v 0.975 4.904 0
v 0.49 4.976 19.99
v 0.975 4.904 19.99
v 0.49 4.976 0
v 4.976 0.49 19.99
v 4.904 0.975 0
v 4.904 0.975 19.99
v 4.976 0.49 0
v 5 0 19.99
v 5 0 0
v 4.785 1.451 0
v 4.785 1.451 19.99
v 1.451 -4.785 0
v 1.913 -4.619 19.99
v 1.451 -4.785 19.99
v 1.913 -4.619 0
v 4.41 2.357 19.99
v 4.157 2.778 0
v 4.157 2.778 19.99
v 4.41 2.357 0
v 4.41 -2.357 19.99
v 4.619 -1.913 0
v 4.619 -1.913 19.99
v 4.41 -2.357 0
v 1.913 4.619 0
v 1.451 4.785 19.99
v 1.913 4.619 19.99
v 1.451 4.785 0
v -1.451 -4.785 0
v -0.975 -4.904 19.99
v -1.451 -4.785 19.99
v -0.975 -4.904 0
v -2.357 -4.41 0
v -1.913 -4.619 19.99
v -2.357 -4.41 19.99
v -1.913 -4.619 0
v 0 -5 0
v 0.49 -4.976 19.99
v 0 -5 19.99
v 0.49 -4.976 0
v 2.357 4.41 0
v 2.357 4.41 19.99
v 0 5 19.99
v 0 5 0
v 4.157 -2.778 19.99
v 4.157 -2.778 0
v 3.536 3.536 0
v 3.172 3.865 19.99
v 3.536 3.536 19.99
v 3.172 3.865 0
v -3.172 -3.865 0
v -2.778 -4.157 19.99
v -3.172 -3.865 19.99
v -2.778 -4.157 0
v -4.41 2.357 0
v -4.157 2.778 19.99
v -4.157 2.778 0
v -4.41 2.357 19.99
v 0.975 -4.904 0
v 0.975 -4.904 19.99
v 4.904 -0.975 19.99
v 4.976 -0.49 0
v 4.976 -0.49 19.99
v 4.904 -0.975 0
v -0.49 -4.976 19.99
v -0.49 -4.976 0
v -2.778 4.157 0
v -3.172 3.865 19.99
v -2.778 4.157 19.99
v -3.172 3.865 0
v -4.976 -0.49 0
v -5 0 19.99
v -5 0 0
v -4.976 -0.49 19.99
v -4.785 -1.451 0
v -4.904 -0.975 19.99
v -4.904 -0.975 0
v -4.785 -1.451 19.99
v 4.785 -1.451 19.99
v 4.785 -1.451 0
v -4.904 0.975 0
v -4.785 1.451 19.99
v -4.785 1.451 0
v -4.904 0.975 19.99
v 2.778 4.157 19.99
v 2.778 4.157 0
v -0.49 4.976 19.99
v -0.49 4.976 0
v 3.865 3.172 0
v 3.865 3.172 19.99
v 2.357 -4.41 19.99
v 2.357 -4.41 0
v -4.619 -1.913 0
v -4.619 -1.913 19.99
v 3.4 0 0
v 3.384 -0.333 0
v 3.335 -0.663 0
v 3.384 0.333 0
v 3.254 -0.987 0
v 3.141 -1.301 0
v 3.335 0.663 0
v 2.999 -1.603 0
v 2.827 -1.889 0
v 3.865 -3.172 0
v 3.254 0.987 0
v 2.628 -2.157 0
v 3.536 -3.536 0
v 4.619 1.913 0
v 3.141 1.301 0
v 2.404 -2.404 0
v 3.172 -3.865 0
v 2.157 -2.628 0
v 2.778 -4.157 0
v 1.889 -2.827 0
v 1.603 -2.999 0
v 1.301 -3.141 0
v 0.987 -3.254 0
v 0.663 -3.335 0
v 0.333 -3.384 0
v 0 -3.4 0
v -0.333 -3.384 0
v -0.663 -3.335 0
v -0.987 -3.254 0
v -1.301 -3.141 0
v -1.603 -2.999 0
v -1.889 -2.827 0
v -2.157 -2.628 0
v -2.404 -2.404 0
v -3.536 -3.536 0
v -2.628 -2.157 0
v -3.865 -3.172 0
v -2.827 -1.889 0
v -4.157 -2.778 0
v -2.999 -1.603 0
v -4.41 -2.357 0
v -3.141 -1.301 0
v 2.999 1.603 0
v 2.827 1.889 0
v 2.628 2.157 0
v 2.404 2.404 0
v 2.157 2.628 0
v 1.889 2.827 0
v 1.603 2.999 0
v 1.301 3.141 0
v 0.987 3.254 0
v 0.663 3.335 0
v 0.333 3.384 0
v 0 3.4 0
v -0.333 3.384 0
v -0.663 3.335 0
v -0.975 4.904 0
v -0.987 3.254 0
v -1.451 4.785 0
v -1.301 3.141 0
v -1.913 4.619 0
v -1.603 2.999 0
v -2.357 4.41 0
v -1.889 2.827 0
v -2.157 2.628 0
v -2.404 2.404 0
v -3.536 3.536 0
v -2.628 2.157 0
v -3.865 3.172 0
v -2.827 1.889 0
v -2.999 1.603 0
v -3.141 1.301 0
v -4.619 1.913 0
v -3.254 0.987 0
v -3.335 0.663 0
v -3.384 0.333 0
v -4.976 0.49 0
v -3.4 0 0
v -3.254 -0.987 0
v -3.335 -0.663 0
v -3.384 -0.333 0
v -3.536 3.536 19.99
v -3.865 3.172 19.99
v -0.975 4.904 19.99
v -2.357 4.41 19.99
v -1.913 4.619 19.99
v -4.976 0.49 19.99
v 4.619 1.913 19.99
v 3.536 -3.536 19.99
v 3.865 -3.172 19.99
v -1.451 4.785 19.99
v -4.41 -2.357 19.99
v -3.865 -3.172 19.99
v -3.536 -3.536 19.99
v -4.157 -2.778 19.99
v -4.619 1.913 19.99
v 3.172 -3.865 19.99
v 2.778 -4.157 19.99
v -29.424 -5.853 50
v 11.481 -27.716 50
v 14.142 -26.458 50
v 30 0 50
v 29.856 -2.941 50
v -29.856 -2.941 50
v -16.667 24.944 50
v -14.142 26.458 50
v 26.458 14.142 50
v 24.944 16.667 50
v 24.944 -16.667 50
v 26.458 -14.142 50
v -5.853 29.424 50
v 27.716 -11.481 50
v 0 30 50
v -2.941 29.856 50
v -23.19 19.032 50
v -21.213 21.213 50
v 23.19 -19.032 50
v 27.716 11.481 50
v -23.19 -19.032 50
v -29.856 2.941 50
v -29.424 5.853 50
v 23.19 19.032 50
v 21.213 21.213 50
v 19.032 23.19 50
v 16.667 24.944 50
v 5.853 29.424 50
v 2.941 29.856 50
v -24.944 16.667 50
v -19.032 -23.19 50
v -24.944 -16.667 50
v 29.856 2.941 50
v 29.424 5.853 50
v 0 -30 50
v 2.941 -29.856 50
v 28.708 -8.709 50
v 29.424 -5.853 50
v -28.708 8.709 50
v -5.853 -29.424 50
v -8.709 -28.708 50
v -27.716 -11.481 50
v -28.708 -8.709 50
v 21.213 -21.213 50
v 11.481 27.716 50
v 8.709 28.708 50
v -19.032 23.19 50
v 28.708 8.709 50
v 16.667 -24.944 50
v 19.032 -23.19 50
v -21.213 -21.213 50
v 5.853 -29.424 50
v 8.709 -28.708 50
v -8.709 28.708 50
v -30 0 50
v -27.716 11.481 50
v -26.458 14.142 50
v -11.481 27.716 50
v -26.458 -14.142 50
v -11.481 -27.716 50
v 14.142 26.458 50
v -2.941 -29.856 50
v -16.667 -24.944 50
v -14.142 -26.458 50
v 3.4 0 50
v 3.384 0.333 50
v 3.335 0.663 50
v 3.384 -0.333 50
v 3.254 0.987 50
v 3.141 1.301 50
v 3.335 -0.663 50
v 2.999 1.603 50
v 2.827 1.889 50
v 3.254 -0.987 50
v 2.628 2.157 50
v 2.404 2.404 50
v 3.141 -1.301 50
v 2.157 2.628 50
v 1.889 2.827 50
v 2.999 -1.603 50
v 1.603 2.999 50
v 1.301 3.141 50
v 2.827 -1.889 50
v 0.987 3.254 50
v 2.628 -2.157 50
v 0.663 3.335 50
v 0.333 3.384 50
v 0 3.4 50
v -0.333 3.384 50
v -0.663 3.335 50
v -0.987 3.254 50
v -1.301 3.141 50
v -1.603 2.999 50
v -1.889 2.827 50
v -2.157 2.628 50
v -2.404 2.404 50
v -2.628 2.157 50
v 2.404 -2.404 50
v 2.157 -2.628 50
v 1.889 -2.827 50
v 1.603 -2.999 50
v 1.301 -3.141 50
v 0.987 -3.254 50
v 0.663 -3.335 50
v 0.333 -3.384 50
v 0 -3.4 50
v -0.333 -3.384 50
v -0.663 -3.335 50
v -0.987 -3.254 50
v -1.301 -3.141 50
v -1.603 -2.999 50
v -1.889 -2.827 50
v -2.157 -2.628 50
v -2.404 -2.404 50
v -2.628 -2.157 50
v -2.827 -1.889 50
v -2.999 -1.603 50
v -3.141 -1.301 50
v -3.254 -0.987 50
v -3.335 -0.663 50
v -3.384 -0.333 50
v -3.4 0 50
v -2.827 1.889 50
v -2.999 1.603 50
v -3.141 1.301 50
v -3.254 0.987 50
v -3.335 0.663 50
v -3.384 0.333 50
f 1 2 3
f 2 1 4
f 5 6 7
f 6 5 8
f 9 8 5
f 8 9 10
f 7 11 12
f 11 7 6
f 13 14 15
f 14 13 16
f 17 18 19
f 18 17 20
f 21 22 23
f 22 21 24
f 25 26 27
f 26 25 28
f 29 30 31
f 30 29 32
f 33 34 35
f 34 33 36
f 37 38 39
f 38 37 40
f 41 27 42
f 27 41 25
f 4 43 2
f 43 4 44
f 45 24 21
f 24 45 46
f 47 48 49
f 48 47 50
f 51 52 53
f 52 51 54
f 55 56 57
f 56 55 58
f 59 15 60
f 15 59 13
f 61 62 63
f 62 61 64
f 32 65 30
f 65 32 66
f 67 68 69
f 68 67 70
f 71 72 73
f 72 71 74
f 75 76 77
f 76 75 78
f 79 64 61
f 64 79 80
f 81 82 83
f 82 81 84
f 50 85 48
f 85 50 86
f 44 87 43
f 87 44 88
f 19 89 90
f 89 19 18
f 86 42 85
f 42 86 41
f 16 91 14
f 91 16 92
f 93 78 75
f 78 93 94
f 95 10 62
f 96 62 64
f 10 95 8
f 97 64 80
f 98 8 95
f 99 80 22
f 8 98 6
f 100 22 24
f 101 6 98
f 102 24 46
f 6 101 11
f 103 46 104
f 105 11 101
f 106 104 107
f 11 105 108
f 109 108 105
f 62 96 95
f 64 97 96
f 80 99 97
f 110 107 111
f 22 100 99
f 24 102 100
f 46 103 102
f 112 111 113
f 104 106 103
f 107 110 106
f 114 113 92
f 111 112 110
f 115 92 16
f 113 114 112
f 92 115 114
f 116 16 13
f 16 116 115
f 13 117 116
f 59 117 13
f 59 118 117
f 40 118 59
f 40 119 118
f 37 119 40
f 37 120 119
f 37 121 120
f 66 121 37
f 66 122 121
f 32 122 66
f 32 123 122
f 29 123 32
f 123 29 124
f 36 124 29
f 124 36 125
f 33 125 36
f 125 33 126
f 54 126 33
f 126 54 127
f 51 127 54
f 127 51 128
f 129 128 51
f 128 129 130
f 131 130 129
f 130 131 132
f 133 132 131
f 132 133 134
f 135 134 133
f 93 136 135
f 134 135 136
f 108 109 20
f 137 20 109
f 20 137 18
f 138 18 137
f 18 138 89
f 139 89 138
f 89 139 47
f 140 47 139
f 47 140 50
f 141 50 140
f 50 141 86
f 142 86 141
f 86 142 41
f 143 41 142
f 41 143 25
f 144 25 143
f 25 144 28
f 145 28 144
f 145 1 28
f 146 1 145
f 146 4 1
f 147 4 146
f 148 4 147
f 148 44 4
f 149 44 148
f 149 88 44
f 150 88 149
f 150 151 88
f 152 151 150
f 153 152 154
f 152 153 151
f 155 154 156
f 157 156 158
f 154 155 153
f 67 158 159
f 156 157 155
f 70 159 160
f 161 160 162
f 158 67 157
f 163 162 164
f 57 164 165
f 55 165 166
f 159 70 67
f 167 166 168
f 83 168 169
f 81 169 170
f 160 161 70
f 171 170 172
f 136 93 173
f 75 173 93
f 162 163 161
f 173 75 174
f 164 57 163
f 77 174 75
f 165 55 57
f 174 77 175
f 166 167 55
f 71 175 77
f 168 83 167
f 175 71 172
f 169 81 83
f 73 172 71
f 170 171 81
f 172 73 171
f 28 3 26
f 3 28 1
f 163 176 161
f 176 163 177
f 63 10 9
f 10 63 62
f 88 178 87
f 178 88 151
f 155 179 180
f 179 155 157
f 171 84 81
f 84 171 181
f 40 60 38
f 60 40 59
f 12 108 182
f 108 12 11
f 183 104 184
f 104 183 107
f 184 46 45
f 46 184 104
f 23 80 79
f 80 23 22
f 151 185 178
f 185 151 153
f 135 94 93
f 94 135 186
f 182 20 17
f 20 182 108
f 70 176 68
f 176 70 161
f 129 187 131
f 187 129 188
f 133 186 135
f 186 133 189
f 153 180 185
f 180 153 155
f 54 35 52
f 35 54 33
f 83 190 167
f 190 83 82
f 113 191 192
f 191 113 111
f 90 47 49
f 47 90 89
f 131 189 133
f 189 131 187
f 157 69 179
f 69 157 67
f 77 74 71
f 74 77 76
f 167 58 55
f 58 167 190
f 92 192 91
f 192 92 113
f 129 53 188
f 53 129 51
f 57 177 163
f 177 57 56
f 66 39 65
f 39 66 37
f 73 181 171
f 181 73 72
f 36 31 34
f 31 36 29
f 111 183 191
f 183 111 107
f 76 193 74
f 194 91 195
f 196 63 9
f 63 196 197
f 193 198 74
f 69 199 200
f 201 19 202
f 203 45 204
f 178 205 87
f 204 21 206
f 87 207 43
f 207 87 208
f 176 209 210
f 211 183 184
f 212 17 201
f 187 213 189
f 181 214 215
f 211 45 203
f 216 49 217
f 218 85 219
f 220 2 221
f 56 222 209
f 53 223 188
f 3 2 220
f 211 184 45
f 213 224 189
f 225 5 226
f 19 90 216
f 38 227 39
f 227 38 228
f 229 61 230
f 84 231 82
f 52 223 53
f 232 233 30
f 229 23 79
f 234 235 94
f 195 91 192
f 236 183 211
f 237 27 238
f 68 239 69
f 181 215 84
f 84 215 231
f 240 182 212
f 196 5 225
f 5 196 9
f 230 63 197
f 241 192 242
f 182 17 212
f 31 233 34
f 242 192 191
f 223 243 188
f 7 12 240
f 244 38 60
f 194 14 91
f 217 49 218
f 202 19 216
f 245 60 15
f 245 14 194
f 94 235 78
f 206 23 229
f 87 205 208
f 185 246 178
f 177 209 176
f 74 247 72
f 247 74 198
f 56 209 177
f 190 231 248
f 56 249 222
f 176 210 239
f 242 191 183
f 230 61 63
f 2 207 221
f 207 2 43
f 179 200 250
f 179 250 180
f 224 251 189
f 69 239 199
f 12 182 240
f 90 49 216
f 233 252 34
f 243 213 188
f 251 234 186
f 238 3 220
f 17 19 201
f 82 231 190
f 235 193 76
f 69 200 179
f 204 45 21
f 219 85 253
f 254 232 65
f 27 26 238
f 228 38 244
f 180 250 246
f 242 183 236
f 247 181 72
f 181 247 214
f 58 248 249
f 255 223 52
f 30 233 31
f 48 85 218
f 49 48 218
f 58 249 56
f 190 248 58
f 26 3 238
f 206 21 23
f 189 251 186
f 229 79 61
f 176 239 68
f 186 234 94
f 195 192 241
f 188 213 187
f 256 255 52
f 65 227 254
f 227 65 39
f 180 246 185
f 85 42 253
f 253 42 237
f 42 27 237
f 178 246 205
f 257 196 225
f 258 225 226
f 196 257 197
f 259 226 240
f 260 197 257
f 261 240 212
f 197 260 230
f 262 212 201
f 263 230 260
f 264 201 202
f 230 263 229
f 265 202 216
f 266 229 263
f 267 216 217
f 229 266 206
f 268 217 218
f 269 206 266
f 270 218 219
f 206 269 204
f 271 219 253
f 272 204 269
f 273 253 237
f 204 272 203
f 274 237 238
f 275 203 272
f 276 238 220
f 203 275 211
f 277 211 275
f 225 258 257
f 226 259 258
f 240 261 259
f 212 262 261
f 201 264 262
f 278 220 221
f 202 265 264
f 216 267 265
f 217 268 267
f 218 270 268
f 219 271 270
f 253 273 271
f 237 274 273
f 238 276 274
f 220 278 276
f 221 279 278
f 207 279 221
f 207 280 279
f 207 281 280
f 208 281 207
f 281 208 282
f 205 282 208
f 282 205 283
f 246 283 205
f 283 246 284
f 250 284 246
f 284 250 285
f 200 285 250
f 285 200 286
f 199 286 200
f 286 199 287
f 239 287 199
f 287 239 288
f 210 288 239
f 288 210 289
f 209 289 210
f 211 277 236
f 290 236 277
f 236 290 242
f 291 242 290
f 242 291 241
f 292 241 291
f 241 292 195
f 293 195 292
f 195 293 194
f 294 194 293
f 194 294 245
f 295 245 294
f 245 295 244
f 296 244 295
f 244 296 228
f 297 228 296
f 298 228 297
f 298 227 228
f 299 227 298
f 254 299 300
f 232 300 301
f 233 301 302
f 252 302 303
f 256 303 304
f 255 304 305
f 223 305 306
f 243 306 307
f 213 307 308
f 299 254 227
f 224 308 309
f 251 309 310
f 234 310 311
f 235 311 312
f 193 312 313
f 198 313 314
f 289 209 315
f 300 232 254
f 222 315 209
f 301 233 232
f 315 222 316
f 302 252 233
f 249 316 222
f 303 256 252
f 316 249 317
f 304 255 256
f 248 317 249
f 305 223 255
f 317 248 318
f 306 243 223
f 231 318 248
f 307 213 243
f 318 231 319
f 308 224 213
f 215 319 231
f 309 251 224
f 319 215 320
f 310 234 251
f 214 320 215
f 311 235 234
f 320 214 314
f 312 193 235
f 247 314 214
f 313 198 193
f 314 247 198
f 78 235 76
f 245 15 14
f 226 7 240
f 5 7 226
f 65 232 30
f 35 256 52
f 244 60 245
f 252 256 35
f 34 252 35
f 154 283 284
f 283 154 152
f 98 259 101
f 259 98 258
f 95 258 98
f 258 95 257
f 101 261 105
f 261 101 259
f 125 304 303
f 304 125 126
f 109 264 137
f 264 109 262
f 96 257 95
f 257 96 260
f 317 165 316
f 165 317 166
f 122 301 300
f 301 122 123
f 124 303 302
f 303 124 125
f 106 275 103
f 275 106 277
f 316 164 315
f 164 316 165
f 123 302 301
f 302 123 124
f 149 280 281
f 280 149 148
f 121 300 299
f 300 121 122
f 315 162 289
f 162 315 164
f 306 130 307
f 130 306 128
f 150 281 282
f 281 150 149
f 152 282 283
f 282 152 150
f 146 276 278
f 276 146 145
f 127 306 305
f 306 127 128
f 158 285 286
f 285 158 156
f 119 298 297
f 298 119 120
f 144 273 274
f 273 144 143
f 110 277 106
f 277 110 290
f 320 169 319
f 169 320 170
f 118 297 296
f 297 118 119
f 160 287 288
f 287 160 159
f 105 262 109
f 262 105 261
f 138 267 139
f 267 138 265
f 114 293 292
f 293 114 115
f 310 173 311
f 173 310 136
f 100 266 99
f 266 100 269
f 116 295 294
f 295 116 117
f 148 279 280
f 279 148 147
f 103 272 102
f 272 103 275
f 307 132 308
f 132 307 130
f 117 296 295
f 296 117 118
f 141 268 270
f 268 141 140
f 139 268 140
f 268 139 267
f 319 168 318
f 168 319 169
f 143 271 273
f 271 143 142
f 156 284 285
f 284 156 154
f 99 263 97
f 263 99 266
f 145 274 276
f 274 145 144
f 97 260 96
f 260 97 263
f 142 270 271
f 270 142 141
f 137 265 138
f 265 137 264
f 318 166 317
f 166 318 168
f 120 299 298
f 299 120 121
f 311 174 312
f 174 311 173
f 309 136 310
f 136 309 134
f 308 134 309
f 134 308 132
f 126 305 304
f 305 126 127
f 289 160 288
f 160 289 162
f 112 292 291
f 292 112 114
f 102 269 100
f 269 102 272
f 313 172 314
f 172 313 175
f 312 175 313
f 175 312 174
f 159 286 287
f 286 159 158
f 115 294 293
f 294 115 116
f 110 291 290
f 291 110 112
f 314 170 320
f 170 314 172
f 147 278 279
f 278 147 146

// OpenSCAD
// Lab funnel - printed upright with wide opening at top
// Units: mm

$fn = 64;

// --- Dimensions ---
spout_od      = 10;    // spout outer diameter
spout_h       = 20;    // spout height (z = 0 to 20)
cone_od_top   = 60;    // cone outer diameter at rim
cone_h        = 30;    // cone height (z = 20 to 50)
wall          = 1.6;   // wall thickness
eps           = 0.5;   // cutter overshoot

bore = spout_od - 2*wall; // 6.8 mm bore

difference() {
    union() {
        // Spout
        cylinder(d = spout_od, h = spout_h);
        // Cone (slightly overlapping spout for a clean union)
        translate([0, 0, spout_h - 0.01])
            cylinder(d1 = spout_od, d2 = cone_od_top, h = cone_h + 0.01);
    }
    // Through-bore along the axis
    translate([0, 0, -eps])
        cylinder(d = bore, h = spout_h + cone_h + 2*eps);
}
